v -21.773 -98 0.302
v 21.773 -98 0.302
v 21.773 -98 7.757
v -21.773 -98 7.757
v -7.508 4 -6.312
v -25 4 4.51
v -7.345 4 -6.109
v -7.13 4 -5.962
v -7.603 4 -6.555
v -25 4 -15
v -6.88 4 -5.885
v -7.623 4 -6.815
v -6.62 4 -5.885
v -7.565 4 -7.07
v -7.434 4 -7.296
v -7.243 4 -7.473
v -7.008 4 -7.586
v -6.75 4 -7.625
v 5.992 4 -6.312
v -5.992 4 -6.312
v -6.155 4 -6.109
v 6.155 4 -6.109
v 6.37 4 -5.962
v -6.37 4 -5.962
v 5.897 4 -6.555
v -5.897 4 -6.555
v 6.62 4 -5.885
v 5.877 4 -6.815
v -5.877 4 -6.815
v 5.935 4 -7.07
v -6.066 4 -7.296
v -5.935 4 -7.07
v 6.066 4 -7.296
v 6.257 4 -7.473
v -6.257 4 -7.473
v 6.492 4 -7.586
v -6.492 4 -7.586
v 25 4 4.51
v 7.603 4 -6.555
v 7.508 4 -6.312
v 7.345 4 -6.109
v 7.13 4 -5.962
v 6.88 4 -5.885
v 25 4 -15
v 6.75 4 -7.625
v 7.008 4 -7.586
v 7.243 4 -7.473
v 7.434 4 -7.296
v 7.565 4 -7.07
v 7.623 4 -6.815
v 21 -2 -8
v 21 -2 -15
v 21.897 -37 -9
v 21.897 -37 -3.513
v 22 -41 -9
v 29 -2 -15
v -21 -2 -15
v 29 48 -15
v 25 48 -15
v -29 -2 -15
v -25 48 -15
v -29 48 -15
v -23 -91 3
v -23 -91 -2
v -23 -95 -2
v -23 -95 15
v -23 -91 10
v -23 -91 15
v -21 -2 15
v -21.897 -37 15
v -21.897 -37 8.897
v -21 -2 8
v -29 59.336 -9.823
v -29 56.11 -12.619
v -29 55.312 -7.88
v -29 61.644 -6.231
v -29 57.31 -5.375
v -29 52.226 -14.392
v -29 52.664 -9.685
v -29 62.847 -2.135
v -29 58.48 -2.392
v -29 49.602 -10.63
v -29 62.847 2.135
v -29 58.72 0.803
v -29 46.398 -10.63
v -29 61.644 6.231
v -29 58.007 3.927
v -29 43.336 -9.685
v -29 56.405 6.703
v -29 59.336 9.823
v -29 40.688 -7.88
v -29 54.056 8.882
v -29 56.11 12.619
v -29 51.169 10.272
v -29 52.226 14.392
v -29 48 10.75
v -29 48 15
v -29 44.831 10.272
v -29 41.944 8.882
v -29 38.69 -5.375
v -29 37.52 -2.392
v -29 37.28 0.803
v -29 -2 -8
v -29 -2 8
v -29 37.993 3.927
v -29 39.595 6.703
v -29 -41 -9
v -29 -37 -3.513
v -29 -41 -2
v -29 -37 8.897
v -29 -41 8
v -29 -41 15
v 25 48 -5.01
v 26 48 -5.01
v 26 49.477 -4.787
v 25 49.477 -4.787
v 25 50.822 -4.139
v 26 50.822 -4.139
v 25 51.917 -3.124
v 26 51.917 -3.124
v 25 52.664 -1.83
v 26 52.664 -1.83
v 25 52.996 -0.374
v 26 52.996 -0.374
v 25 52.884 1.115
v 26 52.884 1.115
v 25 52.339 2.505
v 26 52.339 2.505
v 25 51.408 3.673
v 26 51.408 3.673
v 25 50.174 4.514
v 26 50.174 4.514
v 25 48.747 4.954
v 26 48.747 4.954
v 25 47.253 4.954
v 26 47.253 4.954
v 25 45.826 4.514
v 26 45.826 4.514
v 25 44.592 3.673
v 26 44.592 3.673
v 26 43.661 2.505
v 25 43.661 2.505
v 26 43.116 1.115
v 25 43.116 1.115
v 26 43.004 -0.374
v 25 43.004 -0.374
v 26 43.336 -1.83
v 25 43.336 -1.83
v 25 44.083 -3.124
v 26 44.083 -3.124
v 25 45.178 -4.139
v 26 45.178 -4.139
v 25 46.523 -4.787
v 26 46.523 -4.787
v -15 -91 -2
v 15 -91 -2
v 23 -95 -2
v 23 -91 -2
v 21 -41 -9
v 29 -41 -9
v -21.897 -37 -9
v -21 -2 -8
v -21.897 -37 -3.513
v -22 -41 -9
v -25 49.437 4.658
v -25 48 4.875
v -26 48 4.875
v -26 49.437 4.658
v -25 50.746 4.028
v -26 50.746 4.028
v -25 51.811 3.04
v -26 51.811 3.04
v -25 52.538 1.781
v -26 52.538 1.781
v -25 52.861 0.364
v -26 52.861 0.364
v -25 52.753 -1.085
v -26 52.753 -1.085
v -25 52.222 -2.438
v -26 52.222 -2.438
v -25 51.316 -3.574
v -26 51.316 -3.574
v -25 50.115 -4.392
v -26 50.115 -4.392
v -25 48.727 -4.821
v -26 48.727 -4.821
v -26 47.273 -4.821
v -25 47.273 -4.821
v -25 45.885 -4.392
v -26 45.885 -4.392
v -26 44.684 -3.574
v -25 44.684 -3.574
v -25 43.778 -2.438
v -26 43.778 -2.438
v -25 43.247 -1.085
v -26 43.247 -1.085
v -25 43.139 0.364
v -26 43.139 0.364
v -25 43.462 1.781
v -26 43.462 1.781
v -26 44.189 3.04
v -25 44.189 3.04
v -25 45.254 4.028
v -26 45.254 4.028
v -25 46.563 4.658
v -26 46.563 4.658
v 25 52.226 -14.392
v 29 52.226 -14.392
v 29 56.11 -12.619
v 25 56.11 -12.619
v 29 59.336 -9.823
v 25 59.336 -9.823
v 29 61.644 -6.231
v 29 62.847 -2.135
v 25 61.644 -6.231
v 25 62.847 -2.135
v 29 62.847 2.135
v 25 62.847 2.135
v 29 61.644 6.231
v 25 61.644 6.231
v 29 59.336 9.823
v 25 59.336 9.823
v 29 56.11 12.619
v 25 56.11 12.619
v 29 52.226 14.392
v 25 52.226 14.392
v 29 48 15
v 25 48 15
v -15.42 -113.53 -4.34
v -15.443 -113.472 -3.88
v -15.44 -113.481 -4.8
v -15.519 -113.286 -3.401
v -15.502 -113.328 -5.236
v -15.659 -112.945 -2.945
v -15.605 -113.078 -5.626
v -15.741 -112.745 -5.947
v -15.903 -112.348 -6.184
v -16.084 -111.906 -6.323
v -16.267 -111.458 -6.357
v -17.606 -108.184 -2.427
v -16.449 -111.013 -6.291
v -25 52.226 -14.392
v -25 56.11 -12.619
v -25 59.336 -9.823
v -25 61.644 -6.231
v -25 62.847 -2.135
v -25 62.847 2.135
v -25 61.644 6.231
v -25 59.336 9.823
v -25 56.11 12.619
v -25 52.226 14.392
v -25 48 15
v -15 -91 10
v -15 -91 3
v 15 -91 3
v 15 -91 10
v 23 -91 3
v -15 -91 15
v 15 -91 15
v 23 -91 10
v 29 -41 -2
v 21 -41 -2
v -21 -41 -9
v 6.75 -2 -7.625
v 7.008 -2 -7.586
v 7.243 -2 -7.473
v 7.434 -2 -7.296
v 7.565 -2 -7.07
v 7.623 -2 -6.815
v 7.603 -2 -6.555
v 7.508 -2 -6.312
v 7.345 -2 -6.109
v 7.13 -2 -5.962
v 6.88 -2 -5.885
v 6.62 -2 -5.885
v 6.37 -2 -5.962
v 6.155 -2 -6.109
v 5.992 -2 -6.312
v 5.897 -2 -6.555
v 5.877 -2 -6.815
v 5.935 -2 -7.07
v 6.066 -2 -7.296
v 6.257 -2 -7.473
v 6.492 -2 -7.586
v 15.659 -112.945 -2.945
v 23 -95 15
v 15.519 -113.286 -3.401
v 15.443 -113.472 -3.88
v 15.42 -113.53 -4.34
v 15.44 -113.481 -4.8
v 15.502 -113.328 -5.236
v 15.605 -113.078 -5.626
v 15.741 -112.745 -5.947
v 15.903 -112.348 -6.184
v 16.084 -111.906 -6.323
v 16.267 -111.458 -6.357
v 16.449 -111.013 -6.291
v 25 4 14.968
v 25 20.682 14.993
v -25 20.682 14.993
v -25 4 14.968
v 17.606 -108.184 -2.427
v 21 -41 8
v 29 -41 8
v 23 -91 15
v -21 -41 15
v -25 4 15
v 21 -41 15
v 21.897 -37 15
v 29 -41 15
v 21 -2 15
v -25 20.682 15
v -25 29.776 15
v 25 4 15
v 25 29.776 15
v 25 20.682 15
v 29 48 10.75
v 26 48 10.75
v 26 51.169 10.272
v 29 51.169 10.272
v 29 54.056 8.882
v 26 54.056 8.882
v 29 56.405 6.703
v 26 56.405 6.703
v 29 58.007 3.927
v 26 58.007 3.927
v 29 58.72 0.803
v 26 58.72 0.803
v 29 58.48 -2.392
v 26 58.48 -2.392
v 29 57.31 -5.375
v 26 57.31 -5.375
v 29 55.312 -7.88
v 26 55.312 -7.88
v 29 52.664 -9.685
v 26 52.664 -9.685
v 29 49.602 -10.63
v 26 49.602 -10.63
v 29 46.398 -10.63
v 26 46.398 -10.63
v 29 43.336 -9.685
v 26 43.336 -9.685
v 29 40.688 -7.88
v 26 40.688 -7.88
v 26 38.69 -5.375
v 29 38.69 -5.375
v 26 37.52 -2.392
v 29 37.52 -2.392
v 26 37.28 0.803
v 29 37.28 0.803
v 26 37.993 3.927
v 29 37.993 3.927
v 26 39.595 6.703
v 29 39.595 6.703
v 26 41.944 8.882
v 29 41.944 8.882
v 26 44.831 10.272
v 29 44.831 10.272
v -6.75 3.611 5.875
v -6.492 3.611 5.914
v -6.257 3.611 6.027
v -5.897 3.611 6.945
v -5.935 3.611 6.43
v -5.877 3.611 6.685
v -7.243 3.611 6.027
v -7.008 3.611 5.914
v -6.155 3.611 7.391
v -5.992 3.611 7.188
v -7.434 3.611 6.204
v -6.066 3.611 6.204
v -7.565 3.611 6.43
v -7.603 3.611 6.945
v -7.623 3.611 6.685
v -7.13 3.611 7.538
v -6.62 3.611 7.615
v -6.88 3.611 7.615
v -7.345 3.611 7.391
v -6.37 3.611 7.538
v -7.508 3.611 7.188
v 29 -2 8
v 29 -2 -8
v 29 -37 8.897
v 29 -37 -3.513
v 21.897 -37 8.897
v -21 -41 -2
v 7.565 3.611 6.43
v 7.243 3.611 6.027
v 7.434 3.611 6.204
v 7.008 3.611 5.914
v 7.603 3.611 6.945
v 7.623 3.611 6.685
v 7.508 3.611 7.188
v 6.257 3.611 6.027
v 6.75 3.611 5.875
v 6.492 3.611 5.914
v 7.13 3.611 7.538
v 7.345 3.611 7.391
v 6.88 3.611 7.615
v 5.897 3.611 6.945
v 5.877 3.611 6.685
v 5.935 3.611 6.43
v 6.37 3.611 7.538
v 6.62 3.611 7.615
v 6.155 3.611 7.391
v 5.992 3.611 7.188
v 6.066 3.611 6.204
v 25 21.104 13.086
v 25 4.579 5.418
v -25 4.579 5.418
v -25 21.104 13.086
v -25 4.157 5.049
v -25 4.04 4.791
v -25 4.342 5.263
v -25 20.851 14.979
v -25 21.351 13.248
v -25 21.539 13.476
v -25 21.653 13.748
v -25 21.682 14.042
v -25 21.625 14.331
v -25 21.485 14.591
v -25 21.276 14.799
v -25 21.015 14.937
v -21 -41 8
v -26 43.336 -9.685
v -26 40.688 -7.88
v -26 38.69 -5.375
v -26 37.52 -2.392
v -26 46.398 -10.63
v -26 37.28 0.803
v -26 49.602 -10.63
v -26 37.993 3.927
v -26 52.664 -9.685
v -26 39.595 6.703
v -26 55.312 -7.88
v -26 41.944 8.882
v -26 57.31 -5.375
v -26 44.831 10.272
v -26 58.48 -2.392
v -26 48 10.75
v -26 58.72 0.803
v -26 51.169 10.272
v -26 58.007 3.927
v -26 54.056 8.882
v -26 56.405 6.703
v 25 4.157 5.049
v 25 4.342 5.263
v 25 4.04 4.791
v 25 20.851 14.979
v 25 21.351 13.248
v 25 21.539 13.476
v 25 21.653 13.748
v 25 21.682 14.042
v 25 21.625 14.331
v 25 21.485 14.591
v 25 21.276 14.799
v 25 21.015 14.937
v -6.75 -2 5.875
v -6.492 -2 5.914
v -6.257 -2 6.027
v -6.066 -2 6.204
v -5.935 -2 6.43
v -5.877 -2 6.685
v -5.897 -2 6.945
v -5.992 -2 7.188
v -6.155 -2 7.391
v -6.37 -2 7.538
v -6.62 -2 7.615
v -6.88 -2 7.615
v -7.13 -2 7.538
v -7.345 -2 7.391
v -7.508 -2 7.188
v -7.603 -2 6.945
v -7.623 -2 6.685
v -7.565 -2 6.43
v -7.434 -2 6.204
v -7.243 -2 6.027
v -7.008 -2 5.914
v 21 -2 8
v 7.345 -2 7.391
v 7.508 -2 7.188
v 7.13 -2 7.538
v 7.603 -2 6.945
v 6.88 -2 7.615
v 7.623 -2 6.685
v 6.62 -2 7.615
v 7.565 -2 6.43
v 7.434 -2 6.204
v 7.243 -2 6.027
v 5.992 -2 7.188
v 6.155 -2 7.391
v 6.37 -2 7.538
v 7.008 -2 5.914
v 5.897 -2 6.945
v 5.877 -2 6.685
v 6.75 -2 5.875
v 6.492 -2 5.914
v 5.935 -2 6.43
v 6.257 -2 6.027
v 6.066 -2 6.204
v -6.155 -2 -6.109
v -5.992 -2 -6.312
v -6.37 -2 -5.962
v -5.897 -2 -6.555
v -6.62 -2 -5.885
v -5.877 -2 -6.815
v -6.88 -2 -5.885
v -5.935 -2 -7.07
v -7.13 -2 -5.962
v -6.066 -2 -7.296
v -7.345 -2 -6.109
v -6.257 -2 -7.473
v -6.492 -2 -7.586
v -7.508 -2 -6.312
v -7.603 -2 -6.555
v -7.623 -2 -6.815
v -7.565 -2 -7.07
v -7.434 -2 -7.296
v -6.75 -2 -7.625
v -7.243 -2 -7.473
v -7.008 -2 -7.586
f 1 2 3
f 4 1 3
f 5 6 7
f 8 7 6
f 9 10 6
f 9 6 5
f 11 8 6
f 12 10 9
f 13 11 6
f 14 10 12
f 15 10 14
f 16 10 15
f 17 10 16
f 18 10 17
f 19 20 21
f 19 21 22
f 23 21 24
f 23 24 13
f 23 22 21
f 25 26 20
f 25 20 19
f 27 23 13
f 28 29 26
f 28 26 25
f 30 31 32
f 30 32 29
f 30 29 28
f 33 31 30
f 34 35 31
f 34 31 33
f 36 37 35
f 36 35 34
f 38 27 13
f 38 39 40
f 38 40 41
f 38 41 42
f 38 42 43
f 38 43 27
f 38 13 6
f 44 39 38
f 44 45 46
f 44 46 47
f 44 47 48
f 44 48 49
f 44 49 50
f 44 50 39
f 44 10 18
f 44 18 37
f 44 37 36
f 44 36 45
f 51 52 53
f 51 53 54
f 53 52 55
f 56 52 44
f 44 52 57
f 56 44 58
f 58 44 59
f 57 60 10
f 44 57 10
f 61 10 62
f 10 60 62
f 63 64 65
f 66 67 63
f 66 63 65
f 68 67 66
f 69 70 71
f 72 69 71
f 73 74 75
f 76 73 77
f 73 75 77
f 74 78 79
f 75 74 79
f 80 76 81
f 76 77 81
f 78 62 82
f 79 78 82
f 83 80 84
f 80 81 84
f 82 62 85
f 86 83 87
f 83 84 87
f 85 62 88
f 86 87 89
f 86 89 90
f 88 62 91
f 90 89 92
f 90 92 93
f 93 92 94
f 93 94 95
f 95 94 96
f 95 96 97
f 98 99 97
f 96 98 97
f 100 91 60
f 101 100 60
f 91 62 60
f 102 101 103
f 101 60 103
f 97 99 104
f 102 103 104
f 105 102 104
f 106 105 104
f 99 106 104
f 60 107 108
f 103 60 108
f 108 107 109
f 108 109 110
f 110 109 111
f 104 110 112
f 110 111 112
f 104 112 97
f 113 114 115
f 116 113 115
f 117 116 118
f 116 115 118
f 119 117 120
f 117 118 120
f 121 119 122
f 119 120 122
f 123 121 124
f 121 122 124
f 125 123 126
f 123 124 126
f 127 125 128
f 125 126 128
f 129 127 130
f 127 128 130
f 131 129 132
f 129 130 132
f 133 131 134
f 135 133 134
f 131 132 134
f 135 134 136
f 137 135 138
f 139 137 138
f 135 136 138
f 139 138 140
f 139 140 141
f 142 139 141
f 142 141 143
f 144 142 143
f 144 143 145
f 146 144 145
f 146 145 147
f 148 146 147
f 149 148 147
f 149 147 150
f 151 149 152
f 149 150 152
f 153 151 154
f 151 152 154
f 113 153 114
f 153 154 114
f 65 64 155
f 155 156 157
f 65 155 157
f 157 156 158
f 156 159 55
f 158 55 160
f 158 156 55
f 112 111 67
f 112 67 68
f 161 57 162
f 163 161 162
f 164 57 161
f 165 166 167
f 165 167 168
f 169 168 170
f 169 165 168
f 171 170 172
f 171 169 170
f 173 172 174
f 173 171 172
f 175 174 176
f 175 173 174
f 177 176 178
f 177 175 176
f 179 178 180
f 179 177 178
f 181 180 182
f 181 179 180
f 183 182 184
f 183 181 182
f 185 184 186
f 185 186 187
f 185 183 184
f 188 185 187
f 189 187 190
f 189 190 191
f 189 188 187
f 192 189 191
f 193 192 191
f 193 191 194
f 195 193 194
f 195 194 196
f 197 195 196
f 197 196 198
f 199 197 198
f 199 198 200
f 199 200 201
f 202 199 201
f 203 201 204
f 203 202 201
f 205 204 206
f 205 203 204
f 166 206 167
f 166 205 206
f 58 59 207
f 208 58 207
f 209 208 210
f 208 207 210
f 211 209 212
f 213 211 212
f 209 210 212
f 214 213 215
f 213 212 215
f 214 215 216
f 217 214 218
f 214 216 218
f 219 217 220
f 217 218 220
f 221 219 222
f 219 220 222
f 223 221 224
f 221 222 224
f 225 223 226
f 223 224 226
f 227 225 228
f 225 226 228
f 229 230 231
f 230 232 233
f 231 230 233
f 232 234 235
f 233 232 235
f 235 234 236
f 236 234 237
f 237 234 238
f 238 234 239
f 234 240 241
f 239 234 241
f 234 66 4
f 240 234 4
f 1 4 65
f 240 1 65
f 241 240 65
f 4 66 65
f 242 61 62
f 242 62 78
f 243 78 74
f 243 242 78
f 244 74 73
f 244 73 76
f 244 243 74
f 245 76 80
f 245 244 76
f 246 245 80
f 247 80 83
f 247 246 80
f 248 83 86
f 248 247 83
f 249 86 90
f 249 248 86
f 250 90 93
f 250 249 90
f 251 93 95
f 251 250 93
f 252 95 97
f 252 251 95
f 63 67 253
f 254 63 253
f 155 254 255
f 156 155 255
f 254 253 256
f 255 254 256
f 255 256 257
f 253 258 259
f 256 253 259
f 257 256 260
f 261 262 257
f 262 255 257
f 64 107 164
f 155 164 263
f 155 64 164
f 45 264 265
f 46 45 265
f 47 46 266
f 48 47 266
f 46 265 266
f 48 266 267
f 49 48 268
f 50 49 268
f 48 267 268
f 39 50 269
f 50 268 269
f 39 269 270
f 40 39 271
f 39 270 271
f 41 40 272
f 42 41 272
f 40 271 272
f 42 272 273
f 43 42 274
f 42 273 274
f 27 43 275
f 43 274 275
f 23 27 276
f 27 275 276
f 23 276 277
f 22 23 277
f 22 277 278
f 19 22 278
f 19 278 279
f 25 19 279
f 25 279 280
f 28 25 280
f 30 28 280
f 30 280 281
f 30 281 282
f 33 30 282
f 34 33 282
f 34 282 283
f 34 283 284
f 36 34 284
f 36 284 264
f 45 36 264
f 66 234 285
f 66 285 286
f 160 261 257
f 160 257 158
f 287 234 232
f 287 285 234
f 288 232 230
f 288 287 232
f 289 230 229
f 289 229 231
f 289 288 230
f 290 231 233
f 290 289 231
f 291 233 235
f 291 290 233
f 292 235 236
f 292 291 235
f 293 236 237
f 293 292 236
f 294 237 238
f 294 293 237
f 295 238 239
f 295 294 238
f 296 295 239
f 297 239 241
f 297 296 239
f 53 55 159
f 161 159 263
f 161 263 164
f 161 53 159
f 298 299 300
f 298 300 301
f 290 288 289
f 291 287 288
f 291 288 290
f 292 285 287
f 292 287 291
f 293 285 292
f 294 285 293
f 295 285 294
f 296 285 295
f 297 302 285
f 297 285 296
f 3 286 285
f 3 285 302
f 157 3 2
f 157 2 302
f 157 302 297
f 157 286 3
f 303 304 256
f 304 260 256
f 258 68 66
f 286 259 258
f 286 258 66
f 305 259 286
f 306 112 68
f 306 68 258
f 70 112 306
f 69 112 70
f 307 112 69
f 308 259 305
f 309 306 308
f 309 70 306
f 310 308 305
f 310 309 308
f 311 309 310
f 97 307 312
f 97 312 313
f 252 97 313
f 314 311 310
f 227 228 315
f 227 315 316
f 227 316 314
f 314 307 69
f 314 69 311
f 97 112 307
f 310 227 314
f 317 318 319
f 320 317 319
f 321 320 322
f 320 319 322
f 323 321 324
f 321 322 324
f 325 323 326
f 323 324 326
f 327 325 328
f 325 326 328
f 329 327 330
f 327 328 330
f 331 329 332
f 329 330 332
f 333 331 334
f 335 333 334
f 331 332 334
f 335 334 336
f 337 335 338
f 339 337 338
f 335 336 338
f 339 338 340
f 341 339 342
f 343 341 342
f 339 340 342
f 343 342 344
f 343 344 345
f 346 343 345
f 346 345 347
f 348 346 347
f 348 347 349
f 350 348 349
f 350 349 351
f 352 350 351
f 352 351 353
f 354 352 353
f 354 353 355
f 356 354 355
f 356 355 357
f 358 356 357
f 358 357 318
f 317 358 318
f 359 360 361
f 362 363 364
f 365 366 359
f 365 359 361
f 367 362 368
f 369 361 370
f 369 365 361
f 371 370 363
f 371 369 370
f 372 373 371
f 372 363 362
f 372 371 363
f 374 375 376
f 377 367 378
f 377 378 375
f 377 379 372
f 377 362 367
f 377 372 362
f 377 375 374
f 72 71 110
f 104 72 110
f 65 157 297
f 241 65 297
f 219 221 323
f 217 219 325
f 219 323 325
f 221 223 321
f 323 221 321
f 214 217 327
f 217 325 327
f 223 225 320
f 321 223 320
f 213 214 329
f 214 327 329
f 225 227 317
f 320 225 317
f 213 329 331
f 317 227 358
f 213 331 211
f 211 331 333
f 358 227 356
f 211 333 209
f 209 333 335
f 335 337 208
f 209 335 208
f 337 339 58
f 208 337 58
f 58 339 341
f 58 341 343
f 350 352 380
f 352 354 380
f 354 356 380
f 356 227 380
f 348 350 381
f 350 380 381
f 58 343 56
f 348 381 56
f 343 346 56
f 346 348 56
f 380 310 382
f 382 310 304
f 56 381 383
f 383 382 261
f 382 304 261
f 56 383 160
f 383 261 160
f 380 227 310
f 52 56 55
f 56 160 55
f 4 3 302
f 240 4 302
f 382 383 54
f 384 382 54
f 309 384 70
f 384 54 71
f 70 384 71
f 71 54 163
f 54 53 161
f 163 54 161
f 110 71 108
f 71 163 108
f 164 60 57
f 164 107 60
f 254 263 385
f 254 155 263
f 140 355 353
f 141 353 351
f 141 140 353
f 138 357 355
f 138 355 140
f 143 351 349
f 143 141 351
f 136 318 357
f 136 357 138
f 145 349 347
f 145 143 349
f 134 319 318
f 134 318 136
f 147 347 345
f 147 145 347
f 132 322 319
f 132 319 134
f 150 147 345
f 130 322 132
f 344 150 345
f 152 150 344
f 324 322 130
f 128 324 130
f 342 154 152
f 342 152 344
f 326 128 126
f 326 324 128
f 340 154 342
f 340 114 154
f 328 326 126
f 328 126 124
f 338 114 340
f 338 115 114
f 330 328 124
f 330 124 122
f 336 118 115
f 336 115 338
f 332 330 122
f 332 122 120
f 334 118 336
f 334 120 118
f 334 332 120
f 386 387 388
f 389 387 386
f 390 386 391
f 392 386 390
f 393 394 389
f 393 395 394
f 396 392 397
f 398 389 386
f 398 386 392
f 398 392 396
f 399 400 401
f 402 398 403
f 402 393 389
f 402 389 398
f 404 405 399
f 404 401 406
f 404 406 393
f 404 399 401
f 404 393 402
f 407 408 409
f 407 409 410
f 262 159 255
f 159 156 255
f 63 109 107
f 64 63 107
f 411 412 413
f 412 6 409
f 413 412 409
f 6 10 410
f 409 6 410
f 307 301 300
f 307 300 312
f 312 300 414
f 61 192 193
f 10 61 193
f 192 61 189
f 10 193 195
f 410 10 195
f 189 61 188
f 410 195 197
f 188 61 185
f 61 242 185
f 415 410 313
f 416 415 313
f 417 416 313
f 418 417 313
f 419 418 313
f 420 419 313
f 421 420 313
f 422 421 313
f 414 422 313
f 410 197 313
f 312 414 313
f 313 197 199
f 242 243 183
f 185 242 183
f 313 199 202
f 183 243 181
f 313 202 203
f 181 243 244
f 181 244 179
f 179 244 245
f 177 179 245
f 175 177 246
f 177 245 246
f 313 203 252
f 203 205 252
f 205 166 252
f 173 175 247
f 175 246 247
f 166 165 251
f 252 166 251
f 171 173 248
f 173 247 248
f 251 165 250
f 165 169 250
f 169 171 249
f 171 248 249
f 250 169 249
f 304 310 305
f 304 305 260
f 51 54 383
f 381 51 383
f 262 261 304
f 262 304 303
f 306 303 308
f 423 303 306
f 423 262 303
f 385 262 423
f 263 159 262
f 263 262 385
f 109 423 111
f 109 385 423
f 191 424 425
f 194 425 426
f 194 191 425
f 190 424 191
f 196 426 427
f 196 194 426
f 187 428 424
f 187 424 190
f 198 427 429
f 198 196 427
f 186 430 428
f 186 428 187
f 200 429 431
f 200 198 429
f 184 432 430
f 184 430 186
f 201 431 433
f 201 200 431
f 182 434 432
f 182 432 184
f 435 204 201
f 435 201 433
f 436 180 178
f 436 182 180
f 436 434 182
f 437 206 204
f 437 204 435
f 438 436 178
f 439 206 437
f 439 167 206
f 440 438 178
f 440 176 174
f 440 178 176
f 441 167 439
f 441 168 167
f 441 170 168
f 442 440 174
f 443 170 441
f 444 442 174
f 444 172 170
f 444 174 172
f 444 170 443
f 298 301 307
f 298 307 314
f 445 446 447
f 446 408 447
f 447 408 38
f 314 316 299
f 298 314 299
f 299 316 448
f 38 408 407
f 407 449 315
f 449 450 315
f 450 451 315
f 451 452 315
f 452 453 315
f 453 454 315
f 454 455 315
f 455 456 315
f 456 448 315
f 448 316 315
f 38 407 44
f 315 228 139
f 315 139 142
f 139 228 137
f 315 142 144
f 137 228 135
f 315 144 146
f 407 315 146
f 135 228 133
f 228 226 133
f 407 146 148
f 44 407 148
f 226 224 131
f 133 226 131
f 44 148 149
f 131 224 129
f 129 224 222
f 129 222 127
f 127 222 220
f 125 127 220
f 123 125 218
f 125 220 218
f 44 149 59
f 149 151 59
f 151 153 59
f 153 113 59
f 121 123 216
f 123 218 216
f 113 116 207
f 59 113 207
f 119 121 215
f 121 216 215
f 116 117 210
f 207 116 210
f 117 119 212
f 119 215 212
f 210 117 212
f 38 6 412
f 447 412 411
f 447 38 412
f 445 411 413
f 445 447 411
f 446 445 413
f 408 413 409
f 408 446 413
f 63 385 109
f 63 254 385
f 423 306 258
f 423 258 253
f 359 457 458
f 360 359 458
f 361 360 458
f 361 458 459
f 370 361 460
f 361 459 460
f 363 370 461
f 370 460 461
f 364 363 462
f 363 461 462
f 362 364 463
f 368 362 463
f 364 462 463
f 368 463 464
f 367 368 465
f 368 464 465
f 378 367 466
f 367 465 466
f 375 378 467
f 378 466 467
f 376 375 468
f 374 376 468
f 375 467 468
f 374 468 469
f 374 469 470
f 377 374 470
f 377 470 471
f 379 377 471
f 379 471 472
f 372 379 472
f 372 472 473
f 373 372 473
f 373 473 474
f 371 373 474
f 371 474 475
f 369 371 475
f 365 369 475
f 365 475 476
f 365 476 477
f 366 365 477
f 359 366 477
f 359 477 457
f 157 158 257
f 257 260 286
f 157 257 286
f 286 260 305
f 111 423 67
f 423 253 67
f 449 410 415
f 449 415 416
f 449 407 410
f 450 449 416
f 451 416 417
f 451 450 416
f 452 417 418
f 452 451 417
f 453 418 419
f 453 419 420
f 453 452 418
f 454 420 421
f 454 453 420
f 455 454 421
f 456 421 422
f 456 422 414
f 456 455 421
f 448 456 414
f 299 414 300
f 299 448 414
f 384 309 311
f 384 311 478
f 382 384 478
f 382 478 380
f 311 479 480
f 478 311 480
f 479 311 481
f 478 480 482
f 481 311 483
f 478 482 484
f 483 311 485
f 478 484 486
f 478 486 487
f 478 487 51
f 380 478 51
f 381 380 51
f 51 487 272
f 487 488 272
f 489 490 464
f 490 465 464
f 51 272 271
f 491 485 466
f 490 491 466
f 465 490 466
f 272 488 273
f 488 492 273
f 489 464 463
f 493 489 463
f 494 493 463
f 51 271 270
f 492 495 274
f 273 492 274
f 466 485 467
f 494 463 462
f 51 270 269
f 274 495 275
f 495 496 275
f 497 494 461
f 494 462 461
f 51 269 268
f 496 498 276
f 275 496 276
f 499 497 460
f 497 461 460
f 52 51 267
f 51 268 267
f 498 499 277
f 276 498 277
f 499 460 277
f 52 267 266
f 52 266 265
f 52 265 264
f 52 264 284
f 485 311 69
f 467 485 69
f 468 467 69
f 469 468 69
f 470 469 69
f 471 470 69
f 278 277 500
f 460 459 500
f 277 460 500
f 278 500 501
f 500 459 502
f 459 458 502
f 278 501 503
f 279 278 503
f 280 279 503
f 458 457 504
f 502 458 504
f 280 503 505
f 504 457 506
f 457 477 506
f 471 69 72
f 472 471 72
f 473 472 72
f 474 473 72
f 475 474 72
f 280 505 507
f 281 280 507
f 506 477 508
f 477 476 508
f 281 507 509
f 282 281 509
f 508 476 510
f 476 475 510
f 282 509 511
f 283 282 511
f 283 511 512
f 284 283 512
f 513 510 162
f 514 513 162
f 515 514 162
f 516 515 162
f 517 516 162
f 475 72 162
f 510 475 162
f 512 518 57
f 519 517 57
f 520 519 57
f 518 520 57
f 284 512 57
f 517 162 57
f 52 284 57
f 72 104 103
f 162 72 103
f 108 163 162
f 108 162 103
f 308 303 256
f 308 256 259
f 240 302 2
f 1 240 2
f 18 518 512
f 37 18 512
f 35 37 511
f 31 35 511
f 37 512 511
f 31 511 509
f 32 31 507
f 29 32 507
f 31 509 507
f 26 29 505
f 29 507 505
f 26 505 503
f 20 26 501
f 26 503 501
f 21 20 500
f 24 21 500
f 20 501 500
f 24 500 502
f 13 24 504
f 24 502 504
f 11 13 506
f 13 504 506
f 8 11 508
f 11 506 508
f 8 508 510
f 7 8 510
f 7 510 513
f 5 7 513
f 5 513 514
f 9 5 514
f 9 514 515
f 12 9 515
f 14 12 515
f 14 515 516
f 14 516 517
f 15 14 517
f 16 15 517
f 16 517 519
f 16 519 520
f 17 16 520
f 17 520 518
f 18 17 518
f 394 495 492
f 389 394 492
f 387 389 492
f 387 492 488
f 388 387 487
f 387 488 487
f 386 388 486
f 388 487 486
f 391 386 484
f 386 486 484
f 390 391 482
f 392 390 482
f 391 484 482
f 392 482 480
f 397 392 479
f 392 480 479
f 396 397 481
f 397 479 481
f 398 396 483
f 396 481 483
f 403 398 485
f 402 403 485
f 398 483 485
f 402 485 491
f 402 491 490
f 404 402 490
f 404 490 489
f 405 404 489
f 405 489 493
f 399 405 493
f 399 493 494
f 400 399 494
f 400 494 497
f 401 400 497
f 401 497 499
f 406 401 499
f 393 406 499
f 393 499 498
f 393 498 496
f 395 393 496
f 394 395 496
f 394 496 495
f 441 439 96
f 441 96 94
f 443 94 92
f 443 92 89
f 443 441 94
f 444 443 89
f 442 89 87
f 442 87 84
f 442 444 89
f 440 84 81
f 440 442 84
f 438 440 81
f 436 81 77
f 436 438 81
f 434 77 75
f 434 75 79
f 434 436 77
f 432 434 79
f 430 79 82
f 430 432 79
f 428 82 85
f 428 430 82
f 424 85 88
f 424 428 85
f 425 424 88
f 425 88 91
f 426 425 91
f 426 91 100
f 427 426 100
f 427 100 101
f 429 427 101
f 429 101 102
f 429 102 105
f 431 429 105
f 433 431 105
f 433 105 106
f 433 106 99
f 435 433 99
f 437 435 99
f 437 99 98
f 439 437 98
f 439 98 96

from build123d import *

# Parameters (mm, degrees)
BOSS_EXTRUDE1_DEPTH      = 4
BOSS_EXTRUDE1_DEPTH_BACK = 2
SKETCH2_W                = 50
SKETCH2_H                = 30
SKETCH3_R                = 10.75
BOSS_EXTRUDE2_DEPTH      = 4
SKETCH4_R                = 10.75
SKETCH4_R_2              = 6.25
BOSS_EXTRUDE3_DEPTH      = 1
SKETCH5_R                = 6.25
SKETCH5_R_2              = 5.01
BOSS_EXTRUDE4_DEPTH      = 1
BOSS_EXTRUDE5_START      = -1
SKETCH6_R                = 6.25
SKETCH6_R_2              = 4.875
BOSS_EXTRUDE5_DEPTH      = 1
SKETCH8_R                = 0.875
CUT_EXTRUDE1_DEPTH       = 10
SKETCH9_W                = 58
SKETCH9_H                = 24
BOSS_EXTRUDE6_DEPTH      = 4
SKETCH15_W               = 46
SKETCH15_H               = 17
BOSS_EXTRUDE7_DEPTH      = 4
BOSS_EXTRUDE8_DEPTH      = 46
SKETCH18_W               = 91.307129758
SKETCH18_H               = 96.091784827
CUT_EXTRUDE3_DEPTH       = 21
FILLET1_R                = 2
BOSS_EXTRUDE9_START      = -4
BOSS_EXTRUDE9_DEPTH      = 50
FILLET3_R                = 1
FILLET4_R                = 1


with BuildPart() as part:
    # Sketch2 → Boss-Extrude1 (new, two sides: drawn at the far end of the back side and taken through both)
    with BuildSketch(Plane(origin=(0, 0, 0), x_dir=(1, 0, 0), z_dir=(0, 1, 0)).offset(-BOSS_EXTRUDE1_DEPTH_BACK)):
        Rectangle(SKETCH2_W, SKETCH2_H)
    extrude(amount=BOSS_EXTRUDE1_DEPTH + BOSS_EXTRUDE1_DEPTH_BACK)

    # Sketch3 → Boss-Extrude2 (add)
    with BuildSketch(Plane.ZY.offset(25)):
        with BuildLine():
            Line((-15, -2), (-15, 48))
            ThreePointArc((-15, 48), (0, 63), (15, 48))
            Line((15, 48), (15, -2))
            Line((15, -2), (-15, -2))
        make_face()
        with Locations((0, 48)):
            Circle(SKETCH3_R, mode=Mode.SUBTRACT)
    boss_extrude2 = extrude(amount=BOSS_EXTRUDE2_DEPTH)

    # Mirror1: Boss-Extrude2 across plane
    add(boss_extrude2.mirror(Plane(origin=(0, 0, 0), x_dir=(0, 0, 1), z_dir=(1, 0, 0))))

    # Sketch4 → Boss-Extrude3 (add)
    with BuildSketch(Plane(origin=(-25, 0, 0), x_dir=(0, 0, -1), z_dir=(1, 0, 0))):
        with Locations((0, 48)):
            Circle(SKETCH4_R)
        with Locations((0, 48)):
            Circle(SKETCH4_R_2, mode=Mode.SUBTRACT)
    boss_extrude3 = extrude(amount=-BOSS_EXTRUDE3_DEPTH)

    # Mirror2: Boss-Extrude3 across plane
    add(boss_extrude3.mirror(Plane(origin=(0, 0, 0), x_dir=(0, 0, 1), z_dir=(1, 0, 0))))

    # Sketch5 → Boss-Extrude4 (add)
    with BuildSketch(Plane(origin=(26, 0, 0), x_dir=(0, 0, -1), z_dir=(1, 0, 0))):
        with Locations((0, 48)):
            Circle(SKETCH5_R)
        with Locations((0, 48)):
            Circle(SKETCH5_R_2, mode=Mode.SUBTRACT)
    extrude(amount=-BOSS_EXTRUDE4_DEPTH)

    # Sketch6 → Boss-Extrude5 (add)
    with BuildSketch(Plane.ZY.offset(26).offset(BOSS_EXTRUDE5_START)):
        with Locations((0, 48)):
            Circle(SKETCH6_R)
        with Locations((0, 48)):
            Circle(SKETCH6_R_2, mode=Mode.SUBTRACT)
    extrude(amount=BOSS_EXTRUDE5_DEPTH)

    # Sketch8 → Cut-Extrude1 (cut)
    with BuildSketch(Plane.XZ.offset(2)):
        with Locations(Location((-6.75, 6.75, 0), (0, 0, 270))):
            Circle(SKETCH8_R)
        with Locations(Location((6.75, 6.75, 0), (0, 0, 270))):
            Circle(SKETCH8_R)
        with Locations(Location((6.75, -6.75, 0), (0, 0, 270))):
            Circle(SKETCH8_R)
        with Locations(Location((-6.75, -6.75, 0), (0, 0, 270))):
            Circle(SKETCH8_R)
    extrude(amount=-CUT_EXTRUDE1_DEPTH, mode=Mode.SUBTRACT)



with BuildPart() as body_2:
    # Sketch9 → Boss-Extrude6 (new body)
    with BuildSketch(Plane(origin=(0, -37, 0), x_dir=(-1, 0, 0), z_dir=(0, -1, 0))):
        with Locations((0, -3)):
            Rectangle(SKETCH9_W, SKETCH9_H)
    extrude(amount=BOSS_EXTRUDE6_DEPTH)


with BuildPart() as part_1:
    add(part.part)

    add(body_2.part)  # Loft3 merges body 2
    # Sketch11 → Loft3 section 0
    with BuildSketch(Plane.XZ.offset(2)):
        with BuildLine():
            Line((-29, -15), (-21, -15))
            Line((-21, -15), (-21, -8))
            Line((-21, -8), (-29, -8))
            Line((-29, -8), (-29, -15))
        make_face()
    # Sketch10 → Loft3 section 1
    with BuildSketch(Plane.XZ.offset(41)):
        with BuildLine():
            Line((-29, -9), (-22, -9))
            Line((-22, -9), (-22, -3))
            Line((-22, -3), (-29, -3))
            Line((-29, -3), (-29, -9))
        make_face()
    loft()

    # Sketch11<6> → Loft4 section 0
    with BuildSketch(Plane.XZ.offset(2)):
        with BuildLine():
            Line((-29, 15), (-21, 15))
            Line((-21, 15), (-21, 8))
            Line((-21, 8), (-29, 8))
            Line((-29, 8), (-29, 15))
        make_face()
    # Sketch10<6> → Loft4 section 1
    with BuildSketch(Plane.XZ.offset(41)):
        with BuildLine():
            Line((-29, 15), (-22, 15))
            Line((-22, 15), (-22, 9))
            Line((-22, 9), (-29, 9))
            Line((-29, 9), (-29, 15))
        make_face()
    loft()

    # Sketch11<7> → Loft5 section 0
    with BuildSketch(Plane.XZ.offset(2)):
        with BuildLine():
            Line((29, 15), (21, 15))
            Line((21, 15), (21, 8))
            Line((21, 8), (29, 8))
            Line((29, 8), (29, 15))
        make_face()
    # Sketch10<7> → Loft5 section 1
    with BuildSketch(Plane.XZ.offset(41)):
        with BuildLine():
            Line((29, 15), (22, 15))
            Line((22, 15), (22, 9))
            Line((22, 9), (29, 9))
            Line((29, 9), (29, 15))
        make_face()
    loft()

    # Sketch11<8> → Loft6 section 0
    with BuildSketch(Plane.XZ.offset(2)):
        with BuildLine():
            Line((29, -15), (21, -15))
            Line((21, -15), (21, -8))
            Line((21, -8), (29, -8))
            Line((29, -8), (29, -15))
        make_face()
    # Sketch10<8> → Loft6 section 1
    with BuildSketch(Plane.XZ.offset(41)):
        with BuildLine():
            Line((29, -9), (22, -9))
            Line((22, -9), (22, -3))
            Line((22, -3), (29, -3))
            Line((29, -3), (29, -9))
        make_face()
    loft()

    # Sketch14 → Loft7 section 0
    with BuildSketch(Plane.XZ.offset(41)):
        with BuildLine():
            Line((-29, -9), (-21, -9))
            Line((-21, -9), (-21, -2))
            Line((-21, -2), (-29, -2))
            Line((-29, -2), (-29, -9))
        make_face()
    # Sketch13 → Loft7 section 1
    with BuildSketch(Plane(origin=(0, -91, 0), x_dir=(-1, 0, 0), z_dir=(0, -1, 0))):
        with BuildLine():
            Line((23, 2), (15, 2))
            Line((15, 2), (15, -3))
            Line((15, -3), (23, -3))
            Line((23, -3), (23, 2))
        make_face()
    loft()

    # Loft8: read off the stored shape, not the designer's step
    # Loft8: loft between two sections, ruled curve by curve
    loft8_from = [
        Edge.make_line((21, -41, -2), (29, -41, -2)),
        Edge.make_line((29, -41, -2), (29, -41, -9)),
        Edge.make_line((21, -41, -9), (21, -41, -2)),
        Edge.make_line((21, -41, -9), (29, -41, -9)),
    ]
    loft8_to = [
        Edge.make_line((15, -91, 3), (23, -91, 3)),
        Edge.make_line((23, -91, 3), (23, -91, -2)),
        Edge.make_line((15, -91, -2), (15, -91, 3)),
        Edge.make_line((15, -91, -2), (23, -91, -2)),
    ]
    loft8 = Solid(Shell([*[Face.make_surface_from_curves(loft8_from[k], loft8_to[k]) for k in range(4)], Face(Wire(loft8_from)), Face(Wire(loft8_to))]))
    add(loft8)

    # Loft9: read off the stored shape, not the designer's step
    # Loft9: loft between two sections, ruled curve by curve
    loft9_from = [
        Edge.make_line((29, -41, 15), (29, -41, 8)),
        Edge.make_line((21, -41, 8), (21, -41, 15)),
        Edge.make_line((29, -41, 8), (21, -41, 8)),
        Edge.make_line((21, -41, 15), (29, -41, 15)),
    ]
    loft9_to = [
        Edge.make_line((23, -91, 15), (23, -91, 10)),
        Edge.make_line((15, -91, 10), (15, -91, 15)),
        Edge.make_line((23, -91, 10), (15, -91, 10)),
        Edge.make_line((15, -91, 15), (23, -91, 15)),
    ]
    loft9 = Solid(Shell([*[Face.make_surface_from_curves(loft9_from[k], loft9_to[k]) for k in range(4)], Face(Wire(loft9_from)), Face(Wire(loft9_to))]))
    add(loft9)

    # Loft10: read off the stored shape, not the designer's step
    # Loft10: loft between two sections, ruled curve by curve
    loft10_from = [
        Edge.make_line((-21, -41, 15), (-21, -41, 8)),
        Edge.make_line((-29, -41, 8), (-29, -41, 15)),
        Edge.make_line((-21, -41, 8), (-29, -41, 8)),
        Edge.make_line((-29, -41, 15), (-21, -41, 15)),
    ]
    loft10_to = [
        Edge.make_line((-15, -91, 15), (-15, -91, 10)),
        Edge.make_line((-23, -91, 10), (-23, -91, 15)),
        Edge.make_line((-15, -91, 10), (-23, -91, 10)),
        Edge.make_line((-23, -91, 15), (-15, -91, 15)),
    ]
    loft10 = Solid(Shell([*[Face.make_surface_from_curves(loft10_from[k], loft10_to[k]) for k in range(4)], Face(Wire(loft10_from)), Face(Wire(loft10_to))]))
    add(loft10)

    # Sketch15 → Boss-Extrude7 (add)
    with BuildSketch(Plane.XZ.offset(91)):
        with Locations((0, 6.5)):
            Rectangle(SKETCH15_W, SKETCH15_H)
    extrude(amount=BOSS_EXTRUDE7_DEPTH)

    # Sketch16 → Boss-Extrude8 (add)
    with BuildSketch(Plane.ZY.offset(23)):
        Polygon((15, -95), (-2, -95), (-8.222431864, -118.222431864), align=None)
        Polygon((-2.426876907, -108.184236219), (0.301980964, -98), (7.757359313, -98), align=None, mode=Mode.SUBTRACT)
    extrude(amount=-BOSS_EXTRUDE8_DEPTH)

    # Sketch18 → Cut-Extrude3 (cut)
    with BuildSketch(Plane(origin=(-52.994526892, -21.679383469, 0), x_dir=(0, 0, -1), z_dir=(0.9255481540620362, 0.37862991761396436, 0))):
        with Locations((11.5562698, -126.796989603)):
            Rectangle(SKETCH18_W, SKETCH18_H)
    cut_extrude3 = extrude(amount=-CUT_EXTRUDE3_DEPTH, mode=Mode.SUBTRACT)

    # Mirror3: Cut-Extrude3 across plane
    add(cut_extrude3.mirror(Plane.ZY), mode=Mode.SUBTRACT)

    # Fillet1
    fillet1_edges = [part_1.edges().sort_by_distance(p)[0] for p in [
        (0, -118.222431864, -8.222431864),
    ]]
    fillet(fillet1_edges, radius=FILLET1_R)

    # Sketch22 → Boss-Extrude9 (add)
    with BuildSketch(Plane.ZY.offset(29).offset(BOSS_EXTRUDE9_START)):
        Polygon((14.968137022, 3.610533067), (9.468137022, 3.610533067), (4.968137022, 3.610533067), (15, 25.228846085), (14.968137022, 3.960925502), align=None)
    extrude(amount=-BOSS_EXTRUDE9_DEPTH)

    # Fillet3
    fillet3_edges = [part_1.edges().sort_by_distance(p)[0] for p in [
        (0, 4, 5.148867077),
    ]]
    fillet(fillet3_edges, radius=FILLET3_R)

    # Fillet4
    fillet4_edges = [part_1.edges().sort_by_distance(p)[0] for p in [
        (0, 25.228846085, 15),
    ]]
    fillet(fillet4_edges, radius=FILLET4_R)


solid = part_1.part
